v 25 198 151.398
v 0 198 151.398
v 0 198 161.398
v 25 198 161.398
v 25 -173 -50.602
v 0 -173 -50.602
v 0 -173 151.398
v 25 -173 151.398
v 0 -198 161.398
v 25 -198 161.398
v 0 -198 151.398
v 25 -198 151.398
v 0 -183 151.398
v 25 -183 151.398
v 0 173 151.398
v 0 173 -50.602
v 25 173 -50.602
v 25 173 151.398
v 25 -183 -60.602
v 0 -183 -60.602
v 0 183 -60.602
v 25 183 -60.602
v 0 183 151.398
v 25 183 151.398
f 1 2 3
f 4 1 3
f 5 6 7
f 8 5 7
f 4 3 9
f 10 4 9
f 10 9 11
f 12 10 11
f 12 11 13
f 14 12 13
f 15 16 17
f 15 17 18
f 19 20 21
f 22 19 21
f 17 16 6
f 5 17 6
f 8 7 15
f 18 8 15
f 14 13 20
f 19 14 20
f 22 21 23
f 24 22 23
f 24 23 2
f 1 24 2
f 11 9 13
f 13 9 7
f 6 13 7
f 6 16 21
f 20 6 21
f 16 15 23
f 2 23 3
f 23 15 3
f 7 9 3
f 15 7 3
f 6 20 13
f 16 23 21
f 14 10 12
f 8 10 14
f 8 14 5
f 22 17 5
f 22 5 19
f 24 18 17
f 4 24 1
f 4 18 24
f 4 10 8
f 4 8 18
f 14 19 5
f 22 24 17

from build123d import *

# Parameters (mm, degrees)
F0_W     = 10
F0_H     = 202
F1_DEPTH = 25


with BuildPart() as f1:
    # F0 (on Right) → F1 (new body)
    with BuildSketch(Plane.YZ):
        Polygon((183, 151.398099), (198, 151.398099), (198, 161.398099), (-198, 161.398099), (-198, 151.398099), (-183, 151.398099), (-173, 151.398099), (173, 151.398099), align=None)
        with Locations((-178, 50.398099)):
            Rectangle(F0_W, F0_H)
        Polygon((183, -60.601901), (183, -50.601901), (173, -50.601901), (-173, -50.601901), (-183, -50.601901), (-183, -60.601901), align=None)
        with Locations((178, 50.398099)):
            Rectangle(F0_W, F0_H)
    extrude(amount=F1_DEPTH)


solid = f1.part
